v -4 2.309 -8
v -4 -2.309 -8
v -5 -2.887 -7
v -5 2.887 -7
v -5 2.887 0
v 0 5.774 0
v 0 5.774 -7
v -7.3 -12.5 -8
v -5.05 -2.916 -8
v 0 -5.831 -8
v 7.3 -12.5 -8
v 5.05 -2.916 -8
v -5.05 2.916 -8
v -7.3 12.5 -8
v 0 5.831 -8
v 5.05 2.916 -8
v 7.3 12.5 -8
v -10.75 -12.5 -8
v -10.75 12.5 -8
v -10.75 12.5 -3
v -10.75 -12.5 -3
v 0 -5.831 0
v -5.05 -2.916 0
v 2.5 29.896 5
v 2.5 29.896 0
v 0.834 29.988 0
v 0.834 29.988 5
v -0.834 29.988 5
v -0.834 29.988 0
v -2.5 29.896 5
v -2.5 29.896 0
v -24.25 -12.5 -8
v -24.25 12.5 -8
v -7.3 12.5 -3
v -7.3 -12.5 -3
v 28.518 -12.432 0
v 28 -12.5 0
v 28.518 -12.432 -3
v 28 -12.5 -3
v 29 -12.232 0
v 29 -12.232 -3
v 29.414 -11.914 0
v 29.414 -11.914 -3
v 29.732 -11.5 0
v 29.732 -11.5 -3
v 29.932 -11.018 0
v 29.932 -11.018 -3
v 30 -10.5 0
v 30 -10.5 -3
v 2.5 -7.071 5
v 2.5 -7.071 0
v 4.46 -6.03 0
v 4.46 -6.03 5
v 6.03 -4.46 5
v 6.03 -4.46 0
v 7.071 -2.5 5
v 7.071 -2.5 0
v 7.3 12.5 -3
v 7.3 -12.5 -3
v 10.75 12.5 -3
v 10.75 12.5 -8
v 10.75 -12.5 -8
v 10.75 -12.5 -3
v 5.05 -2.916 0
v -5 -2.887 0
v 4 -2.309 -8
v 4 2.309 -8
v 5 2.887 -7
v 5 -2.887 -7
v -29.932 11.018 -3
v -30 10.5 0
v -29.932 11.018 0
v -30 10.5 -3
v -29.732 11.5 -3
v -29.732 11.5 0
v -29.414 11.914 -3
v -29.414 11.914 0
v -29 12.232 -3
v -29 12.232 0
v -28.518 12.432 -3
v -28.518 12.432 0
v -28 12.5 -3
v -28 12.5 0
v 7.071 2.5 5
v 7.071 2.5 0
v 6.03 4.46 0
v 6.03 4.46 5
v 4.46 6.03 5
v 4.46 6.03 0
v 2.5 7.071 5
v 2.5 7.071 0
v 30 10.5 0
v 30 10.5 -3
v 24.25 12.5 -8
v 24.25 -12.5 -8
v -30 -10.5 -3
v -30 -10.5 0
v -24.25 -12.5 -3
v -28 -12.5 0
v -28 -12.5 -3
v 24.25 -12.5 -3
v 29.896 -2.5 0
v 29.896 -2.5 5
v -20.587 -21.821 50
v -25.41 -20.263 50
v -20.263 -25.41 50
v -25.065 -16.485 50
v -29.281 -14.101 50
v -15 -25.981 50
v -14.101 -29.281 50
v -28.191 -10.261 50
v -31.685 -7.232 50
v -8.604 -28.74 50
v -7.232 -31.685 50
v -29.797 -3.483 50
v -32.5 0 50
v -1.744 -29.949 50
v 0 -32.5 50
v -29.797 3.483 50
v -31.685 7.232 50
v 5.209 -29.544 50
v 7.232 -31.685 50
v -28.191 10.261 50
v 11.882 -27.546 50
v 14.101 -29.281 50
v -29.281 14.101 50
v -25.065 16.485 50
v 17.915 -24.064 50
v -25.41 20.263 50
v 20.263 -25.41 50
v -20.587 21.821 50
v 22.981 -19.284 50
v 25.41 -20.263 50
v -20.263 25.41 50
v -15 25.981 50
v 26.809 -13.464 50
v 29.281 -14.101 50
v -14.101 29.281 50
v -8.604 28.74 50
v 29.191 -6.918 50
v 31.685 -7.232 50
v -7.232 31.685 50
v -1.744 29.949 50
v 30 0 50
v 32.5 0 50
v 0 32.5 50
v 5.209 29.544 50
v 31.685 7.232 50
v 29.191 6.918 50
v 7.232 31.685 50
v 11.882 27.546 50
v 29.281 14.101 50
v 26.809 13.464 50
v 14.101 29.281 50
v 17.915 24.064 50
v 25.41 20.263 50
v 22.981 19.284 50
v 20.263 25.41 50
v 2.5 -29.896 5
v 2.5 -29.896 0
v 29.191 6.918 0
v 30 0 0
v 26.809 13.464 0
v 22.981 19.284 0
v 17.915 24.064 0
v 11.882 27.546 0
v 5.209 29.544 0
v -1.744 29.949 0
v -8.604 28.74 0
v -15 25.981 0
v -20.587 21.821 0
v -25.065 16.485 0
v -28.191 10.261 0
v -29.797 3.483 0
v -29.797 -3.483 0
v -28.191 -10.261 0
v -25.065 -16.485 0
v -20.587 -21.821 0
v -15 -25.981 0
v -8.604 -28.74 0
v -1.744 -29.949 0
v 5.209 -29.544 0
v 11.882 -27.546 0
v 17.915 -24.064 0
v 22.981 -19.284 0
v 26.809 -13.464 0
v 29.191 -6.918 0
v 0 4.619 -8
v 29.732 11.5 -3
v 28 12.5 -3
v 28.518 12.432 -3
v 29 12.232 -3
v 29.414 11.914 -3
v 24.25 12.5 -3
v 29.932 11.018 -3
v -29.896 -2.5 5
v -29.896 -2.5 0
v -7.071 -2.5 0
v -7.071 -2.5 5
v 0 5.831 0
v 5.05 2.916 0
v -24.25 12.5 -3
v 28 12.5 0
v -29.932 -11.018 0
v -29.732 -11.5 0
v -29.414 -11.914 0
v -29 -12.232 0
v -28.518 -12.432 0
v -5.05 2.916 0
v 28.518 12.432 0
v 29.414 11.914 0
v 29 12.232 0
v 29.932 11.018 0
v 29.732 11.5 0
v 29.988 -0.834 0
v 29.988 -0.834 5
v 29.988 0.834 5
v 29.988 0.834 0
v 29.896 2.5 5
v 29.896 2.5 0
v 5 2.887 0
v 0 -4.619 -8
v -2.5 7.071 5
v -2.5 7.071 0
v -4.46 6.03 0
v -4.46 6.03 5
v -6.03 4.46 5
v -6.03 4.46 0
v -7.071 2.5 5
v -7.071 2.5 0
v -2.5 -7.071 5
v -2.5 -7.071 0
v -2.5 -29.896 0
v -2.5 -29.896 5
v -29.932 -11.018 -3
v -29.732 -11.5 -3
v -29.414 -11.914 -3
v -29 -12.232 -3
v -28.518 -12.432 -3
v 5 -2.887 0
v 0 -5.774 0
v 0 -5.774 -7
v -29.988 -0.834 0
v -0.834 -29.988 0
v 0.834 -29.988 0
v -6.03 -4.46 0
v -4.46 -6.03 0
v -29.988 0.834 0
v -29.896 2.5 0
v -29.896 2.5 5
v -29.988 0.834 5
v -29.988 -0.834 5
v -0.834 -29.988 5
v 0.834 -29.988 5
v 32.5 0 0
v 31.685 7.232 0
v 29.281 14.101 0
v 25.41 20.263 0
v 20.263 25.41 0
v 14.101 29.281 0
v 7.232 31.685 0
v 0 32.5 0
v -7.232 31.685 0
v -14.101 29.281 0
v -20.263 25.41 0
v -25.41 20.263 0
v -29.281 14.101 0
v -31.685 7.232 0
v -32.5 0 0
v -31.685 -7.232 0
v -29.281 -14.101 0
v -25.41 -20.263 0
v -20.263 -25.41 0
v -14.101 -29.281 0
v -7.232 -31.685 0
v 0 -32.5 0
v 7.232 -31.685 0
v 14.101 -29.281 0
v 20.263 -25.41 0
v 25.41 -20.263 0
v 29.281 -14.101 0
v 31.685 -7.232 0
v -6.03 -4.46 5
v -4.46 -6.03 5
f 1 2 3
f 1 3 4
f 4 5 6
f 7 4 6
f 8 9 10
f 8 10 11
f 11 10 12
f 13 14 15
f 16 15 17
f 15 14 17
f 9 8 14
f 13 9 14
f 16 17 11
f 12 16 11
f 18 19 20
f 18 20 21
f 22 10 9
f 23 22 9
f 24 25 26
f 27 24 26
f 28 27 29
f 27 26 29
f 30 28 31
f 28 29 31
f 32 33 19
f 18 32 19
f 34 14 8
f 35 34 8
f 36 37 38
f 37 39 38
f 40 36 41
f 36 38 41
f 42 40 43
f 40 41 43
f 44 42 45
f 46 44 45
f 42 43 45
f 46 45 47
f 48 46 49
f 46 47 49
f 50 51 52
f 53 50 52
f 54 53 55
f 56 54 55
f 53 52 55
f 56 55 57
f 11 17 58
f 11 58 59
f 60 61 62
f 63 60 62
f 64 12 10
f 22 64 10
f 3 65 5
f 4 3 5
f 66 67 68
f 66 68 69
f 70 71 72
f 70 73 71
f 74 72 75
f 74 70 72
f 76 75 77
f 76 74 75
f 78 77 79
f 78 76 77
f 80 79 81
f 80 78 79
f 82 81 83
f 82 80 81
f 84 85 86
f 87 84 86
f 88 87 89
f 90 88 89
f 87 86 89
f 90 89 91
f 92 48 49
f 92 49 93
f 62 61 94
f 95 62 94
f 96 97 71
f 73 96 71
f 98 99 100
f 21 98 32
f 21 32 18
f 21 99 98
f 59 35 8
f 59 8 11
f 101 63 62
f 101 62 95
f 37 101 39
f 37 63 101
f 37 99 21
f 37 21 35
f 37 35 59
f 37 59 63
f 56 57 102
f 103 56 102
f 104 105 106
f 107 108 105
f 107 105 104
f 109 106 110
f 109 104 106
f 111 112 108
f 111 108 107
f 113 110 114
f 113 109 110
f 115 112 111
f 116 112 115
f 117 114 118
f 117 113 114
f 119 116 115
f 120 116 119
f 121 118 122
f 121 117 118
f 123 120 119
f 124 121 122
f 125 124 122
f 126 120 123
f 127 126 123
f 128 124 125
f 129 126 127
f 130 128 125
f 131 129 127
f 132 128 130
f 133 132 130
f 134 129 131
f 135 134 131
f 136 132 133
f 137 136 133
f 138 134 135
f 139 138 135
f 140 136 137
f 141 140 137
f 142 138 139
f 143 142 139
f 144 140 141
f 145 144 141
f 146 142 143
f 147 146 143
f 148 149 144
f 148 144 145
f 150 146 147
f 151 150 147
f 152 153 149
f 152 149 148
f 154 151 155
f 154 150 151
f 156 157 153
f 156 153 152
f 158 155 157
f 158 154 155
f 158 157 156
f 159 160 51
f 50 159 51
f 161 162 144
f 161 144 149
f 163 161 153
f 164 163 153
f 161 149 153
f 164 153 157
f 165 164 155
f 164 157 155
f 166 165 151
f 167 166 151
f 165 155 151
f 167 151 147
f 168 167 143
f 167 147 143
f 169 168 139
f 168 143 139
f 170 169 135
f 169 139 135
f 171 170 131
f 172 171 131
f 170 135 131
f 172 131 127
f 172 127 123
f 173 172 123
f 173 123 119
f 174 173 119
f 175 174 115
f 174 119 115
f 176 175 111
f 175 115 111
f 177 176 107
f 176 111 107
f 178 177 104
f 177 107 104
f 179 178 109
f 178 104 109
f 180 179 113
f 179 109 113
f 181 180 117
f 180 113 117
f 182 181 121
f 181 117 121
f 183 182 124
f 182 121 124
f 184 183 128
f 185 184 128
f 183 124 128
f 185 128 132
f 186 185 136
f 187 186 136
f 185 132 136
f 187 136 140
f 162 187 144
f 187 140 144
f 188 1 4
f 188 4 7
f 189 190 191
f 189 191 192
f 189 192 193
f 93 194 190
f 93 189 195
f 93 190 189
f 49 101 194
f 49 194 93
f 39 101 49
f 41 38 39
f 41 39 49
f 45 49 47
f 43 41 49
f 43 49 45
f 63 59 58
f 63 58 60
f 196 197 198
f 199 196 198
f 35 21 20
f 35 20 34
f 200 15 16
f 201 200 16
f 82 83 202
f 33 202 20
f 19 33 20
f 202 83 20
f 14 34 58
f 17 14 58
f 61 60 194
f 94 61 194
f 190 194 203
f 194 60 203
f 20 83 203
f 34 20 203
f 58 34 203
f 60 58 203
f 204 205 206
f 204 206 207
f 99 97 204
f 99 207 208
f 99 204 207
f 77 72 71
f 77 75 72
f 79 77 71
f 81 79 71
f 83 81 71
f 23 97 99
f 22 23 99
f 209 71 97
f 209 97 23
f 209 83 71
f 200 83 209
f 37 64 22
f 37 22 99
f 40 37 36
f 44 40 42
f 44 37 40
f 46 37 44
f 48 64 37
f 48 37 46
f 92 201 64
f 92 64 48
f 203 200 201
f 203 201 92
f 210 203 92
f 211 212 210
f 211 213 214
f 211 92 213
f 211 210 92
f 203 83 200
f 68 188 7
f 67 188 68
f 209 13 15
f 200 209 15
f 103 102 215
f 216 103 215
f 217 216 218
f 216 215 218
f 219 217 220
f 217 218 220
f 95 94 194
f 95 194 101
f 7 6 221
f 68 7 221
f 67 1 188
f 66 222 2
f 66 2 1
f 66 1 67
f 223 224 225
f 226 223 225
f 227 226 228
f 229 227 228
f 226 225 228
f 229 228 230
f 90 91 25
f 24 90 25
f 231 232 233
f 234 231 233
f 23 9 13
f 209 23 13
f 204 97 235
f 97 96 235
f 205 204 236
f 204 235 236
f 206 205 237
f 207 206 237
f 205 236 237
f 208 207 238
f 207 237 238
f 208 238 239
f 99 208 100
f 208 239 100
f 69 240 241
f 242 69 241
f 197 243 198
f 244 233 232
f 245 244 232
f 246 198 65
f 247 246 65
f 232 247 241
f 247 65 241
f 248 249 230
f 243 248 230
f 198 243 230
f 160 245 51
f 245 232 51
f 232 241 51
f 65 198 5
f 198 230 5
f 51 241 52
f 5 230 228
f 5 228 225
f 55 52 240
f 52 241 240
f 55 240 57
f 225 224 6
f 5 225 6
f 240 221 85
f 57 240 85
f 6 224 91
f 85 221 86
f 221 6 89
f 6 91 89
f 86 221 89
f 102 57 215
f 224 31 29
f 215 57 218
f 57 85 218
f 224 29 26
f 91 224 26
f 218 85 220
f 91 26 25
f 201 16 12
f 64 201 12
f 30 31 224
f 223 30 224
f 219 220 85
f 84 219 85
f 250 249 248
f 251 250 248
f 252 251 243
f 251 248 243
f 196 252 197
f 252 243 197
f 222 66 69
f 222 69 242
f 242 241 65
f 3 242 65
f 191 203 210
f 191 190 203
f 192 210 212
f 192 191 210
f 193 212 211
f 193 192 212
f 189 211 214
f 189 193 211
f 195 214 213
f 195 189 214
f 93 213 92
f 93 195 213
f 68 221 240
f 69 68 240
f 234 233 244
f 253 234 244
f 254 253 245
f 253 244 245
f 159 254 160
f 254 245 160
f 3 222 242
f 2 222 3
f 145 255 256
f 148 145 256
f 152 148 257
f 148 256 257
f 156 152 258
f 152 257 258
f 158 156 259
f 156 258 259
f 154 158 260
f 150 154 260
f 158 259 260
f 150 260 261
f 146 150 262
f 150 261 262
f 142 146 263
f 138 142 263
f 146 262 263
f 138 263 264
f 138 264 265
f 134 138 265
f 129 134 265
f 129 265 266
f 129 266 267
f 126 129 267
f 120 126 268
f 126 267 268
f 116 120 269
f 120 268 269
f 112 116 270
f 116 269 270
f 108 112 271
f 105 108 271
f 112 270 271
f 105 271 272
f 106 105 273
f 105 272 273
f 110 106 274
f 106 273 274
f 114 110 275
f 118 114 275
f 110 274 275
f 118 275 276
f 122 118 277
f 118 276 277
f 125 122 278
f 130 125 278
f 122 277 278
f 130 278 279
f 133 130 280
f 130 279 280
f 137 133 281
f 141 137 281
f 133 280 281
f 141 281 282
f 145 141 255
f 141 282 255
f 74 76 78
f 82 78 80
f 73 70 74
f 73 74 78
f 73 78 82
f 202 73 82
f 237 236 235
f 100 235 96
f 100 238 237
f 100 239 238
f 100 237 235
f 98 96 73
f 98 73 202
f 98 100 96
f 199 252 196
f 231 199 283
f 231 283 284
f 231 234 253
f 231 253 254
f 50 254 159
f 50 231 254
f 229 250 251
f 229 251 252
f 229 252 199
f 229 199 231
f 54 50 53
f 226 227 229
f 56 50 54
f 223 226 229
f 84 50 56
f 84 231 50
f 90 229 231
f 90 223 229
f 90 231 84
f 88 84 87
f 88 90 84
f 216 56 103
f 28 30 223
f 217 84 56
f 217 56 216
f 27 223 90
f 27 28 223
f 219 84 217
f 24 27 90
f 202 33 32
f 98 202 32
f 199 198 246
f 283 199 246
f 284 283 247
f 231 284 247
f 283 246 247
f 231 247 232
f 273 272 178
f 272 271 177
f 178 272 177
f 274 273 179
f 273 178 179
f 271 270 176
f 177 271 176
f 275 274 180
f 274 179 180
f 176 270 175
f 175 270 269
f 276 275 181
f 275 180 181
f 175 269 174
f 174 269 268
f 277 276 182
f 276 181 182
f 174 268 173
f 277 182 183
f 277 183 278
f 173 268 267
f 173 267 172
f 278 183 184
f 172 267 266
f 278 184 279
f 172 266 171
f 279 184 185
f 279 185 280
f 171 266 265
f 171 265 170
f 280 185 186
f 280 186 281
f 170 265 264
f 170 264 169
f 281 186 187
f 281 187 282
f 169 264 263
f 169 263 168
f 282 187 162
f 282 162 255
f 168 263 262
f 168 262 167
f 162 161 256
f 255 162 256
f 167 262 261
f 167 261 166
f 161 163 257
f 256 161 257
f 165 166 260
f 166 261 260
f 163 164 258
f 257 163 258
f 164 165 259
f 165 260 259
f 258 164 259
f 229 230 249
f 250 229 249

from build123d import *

# Parameters (mm, degrees)
F0_W      = 60
F0_H      = 25
F1_DEPTH  = 8
F2_W      = 5.75
F2_H      = 25
F2_W_2    = 3.45
F3_DEPTH  = 5
F5_DEPTH  = 8
F6_R      = 32.5
F7_DEPTH  = 50
F8_R      = 30
F9_DEPTH  = 50
F11_DEPTH = 5
F13_DEPTH = 8
F14_SIZE  = 1
F15_R     = 2


with BuildPart() as f1:
    # F0 (on Top) → F1 (new body)
    with BuildSketch(Plane.XY):
        Rectangle(F0_W, F0_H)
    extrude(amount=-F1_DEPTH)

    # F2 (on face) → F3 (cut)
    with BuildSketch(Plane(origin=(0, 0, -8), x_dir=(1, 0, 0), z_dir=(0, 0, -1))):
        with Locations((-27.125, 0)):
            Rectangle(F2_W, F2_H)
        with Locations((-9.025, 0)):
            Rectangle(F2_W_2, F2_H)
        with Locations((9.025, 0)):
            Rectangle(F2_W_2, F2_H)
        with Locations((27.125, 0)):
            Rectangle(F2_W, F2_H)
    extrude(amount=-F3_DEPTH, mode=Mode.SUBTRACT)

    # F4 (on face) → F5 (cut, through all)
    with BuildSketch(Plane(origin=(0, 0, -8), x_dir=(1, 0, 0), z_dir=(0, 0, -1))):
        Polygon((0, -5.831238), (5.05, -2.915619), (5.05, 2.915619), (0, 5.831238), (-5.05, 2.915619), (-5.05, -2.915619), align=None)
    extrude(amount=-F5_DEPTH, mode=Mode.SUBTRACT)

    # F15
    f15_edges = [f1.edges().sort_by_distance(p)[0] for p in [
        (30, 12.5, -1.5),
        (-30, 12.5, -1.5),
        (-30, -12.5, -1.5),
        (30, -12.5, -1.5),
    ]]
    fillet(f15_edges, radius=F15_R)


with BuildPart() as f7:
    # F6 (on Top) → F7 (new body)
    with BuildSketch(Plane.XY):
        Circle(F6_R)
    extrude(amount=F7_DEPTH)

    # F8 (on face) → F9 (cut, through all)
    with BuildSketch(Plane.XY.offset(50)):
        Circle(F8_R)
    extrude(amount=-F9_DEPTH, mode=Mode.SUBTRACT)


with BuildPart() as f11:
    # F10 (on Top) → F11 (new body)
    with BuildSketch(Plane.XY):
        with BuildLine():
            Line((-2.5, 2.5), (-7.071068, 2.5))
            ThreePointArc((-7.071068, 2.5), (-7.5, 0), (-7.071068, -2.5))
            Line((-7.071068, -2.5), (-2.5, -2.5))
            Line((-2.5, -2.5), (-2.5, -7.071068))
            ThreePointArc((-2.5, -7.071068), (0, -7.5), (2.5, -7.071068))
            Line((2.5, -7.071068), (2.5, -2.5))
            Line((2.5, -2.5), (7.071068, -2.5))
            ThreePointArc((7.071068, -2.5), (7.391989, -1.268265), (7.5, 0))
            ThreePointArc((7.5, 0), (7.391989, 1.268265), (7.071068, 2.5))
            Line((7.071068, 2.5), (2.5, 2.5))
            Line((2.5, 2.5), (2.5, 7.071068))
            ThreePointArc((2.5, 7.071068), (0, 7.5), (-2.5, 7.071068))
            Line((-2.5, 7.071068), (-2.5, 2.5))
        make_face()
        with BuildLine():
            Line((-7.071068, 2.5), (-29.895652, 2.5))
            ThreePointArc((-29.895652, 2.5), (-30, 0), (-29.895652, -2.5))
            Line((-29.895652, -2.5), (-7.071068, -2.5))
            ThreePointArc((-7.071068, -2.5), (-7.5, 0), (-7.071068, 2.5))
        make_face()
        with BuildLine():
            Line((29.895652, 2.5), (7.071068, 2.5))
            ThreePointArc((7.071068, 2.5), (7.391989, 1.268265), (7.5, 0))
            ThreePointArc((7.5, 0), (7.391989, -1.268265), (7.071068, -2.5))
            Line((7.071068, -2.5), (29.895652, -2.5))
            ThreePointArc((29.895652, -2.5), (30, 0), (29.895652, 2.5))
        make_face()
        with BuildLine():
            ThreePointArc((2.5, -7.071068), (0, -7.5), (-2.5, -7.071068))
            Line((-2.5, -7.071068), (-2.5, -29.895652))
            ThreePointArc((-2.5, -29.895652), (0, -30), (2.5, -29.895652))
            Line((2.5, -29.895652), (2.5, -7.071068))
        make_face()
        with BuildLine():
            Line((-2.5, 29.895652), (-2.5, 7.071068))
            ThreePointArc((-2.5, 7.071068), (0, 7.5), (2.5, 7.071068))
            Line((2.5, 7.071068), (2.5, 29.895652))
            ThreePointArc((2.5, 29.895652), (0, 30), (-2.5, 29.895652))
        make_face()
        with BuildLine():
            ThreePointArc((-2.5, 7.071068), (-5.303301, 5.303301), (-7.071068, 2.5))
            Line((-7.071068, 2.5), (-2.5, 2.5))
            Line((-2.5, 2.5), (-2.5, 7.071068))
        make_face()
        with BuildLine():
            ThreePointArc((7.071068, 2.5), (5.303301, 5.303301), (2.5, 7.071068))
            Line((2.5, 7.071068), (2.5, 2.5))
            Line((2.5, 2.5), (7.071068, 2.5))
        make_face()
        with BuildLine():
            Line((2.5, -2.5), (2.5, -7.071068))
            ThreePointArc((2.5, -7.071068), (5.303301, -5.303301), (7.071068, -2.5))
            Line((7.071068, -2.5), (2.5, -2.5))
        make_face()
        with BuildLine():
            Line((-2.5, -2.5), (-7.071068, -2.5))
            ThreePointArc((-7.071068, -2.5), (-5.303301, -5.303301), (-2.5, -7.071068))
            Line((-2.5, -7.071068), (-2.5, -2.5))
        make_face()
    extrude(amount=F11_DEPTH)

    # F12 (on face) → F13 (join)
    with BuildSketch(Plane(origin=(0, 0, 0), x_dir=(1, 0, 0), z_dir=(0, 0, -1))):
        Polygon((0, -5.773503), (5, -2.886751), (5, 2.886751), (0, 5.773503), (-5, 2.886751), (-5, -2.886751), align=None)
    extrude(amount=F13_DEPTH)

    # F14
    f14_edges = [f11.edges().sort_by_distance(p)[0] for p in [
        (2.5, 4.330127, -8),
        (5, 0, -8),
        (2.5, -4.330127, -8),
        (-2.5, -4.330127, -8),
        (-5, 0, -8),
        (-2.5, 4.330127, -8),
    ]]
    chamfer(f14_edges, length=F14_SIZE)


solid = Compound([f1.part, f7.part, f11.part])
